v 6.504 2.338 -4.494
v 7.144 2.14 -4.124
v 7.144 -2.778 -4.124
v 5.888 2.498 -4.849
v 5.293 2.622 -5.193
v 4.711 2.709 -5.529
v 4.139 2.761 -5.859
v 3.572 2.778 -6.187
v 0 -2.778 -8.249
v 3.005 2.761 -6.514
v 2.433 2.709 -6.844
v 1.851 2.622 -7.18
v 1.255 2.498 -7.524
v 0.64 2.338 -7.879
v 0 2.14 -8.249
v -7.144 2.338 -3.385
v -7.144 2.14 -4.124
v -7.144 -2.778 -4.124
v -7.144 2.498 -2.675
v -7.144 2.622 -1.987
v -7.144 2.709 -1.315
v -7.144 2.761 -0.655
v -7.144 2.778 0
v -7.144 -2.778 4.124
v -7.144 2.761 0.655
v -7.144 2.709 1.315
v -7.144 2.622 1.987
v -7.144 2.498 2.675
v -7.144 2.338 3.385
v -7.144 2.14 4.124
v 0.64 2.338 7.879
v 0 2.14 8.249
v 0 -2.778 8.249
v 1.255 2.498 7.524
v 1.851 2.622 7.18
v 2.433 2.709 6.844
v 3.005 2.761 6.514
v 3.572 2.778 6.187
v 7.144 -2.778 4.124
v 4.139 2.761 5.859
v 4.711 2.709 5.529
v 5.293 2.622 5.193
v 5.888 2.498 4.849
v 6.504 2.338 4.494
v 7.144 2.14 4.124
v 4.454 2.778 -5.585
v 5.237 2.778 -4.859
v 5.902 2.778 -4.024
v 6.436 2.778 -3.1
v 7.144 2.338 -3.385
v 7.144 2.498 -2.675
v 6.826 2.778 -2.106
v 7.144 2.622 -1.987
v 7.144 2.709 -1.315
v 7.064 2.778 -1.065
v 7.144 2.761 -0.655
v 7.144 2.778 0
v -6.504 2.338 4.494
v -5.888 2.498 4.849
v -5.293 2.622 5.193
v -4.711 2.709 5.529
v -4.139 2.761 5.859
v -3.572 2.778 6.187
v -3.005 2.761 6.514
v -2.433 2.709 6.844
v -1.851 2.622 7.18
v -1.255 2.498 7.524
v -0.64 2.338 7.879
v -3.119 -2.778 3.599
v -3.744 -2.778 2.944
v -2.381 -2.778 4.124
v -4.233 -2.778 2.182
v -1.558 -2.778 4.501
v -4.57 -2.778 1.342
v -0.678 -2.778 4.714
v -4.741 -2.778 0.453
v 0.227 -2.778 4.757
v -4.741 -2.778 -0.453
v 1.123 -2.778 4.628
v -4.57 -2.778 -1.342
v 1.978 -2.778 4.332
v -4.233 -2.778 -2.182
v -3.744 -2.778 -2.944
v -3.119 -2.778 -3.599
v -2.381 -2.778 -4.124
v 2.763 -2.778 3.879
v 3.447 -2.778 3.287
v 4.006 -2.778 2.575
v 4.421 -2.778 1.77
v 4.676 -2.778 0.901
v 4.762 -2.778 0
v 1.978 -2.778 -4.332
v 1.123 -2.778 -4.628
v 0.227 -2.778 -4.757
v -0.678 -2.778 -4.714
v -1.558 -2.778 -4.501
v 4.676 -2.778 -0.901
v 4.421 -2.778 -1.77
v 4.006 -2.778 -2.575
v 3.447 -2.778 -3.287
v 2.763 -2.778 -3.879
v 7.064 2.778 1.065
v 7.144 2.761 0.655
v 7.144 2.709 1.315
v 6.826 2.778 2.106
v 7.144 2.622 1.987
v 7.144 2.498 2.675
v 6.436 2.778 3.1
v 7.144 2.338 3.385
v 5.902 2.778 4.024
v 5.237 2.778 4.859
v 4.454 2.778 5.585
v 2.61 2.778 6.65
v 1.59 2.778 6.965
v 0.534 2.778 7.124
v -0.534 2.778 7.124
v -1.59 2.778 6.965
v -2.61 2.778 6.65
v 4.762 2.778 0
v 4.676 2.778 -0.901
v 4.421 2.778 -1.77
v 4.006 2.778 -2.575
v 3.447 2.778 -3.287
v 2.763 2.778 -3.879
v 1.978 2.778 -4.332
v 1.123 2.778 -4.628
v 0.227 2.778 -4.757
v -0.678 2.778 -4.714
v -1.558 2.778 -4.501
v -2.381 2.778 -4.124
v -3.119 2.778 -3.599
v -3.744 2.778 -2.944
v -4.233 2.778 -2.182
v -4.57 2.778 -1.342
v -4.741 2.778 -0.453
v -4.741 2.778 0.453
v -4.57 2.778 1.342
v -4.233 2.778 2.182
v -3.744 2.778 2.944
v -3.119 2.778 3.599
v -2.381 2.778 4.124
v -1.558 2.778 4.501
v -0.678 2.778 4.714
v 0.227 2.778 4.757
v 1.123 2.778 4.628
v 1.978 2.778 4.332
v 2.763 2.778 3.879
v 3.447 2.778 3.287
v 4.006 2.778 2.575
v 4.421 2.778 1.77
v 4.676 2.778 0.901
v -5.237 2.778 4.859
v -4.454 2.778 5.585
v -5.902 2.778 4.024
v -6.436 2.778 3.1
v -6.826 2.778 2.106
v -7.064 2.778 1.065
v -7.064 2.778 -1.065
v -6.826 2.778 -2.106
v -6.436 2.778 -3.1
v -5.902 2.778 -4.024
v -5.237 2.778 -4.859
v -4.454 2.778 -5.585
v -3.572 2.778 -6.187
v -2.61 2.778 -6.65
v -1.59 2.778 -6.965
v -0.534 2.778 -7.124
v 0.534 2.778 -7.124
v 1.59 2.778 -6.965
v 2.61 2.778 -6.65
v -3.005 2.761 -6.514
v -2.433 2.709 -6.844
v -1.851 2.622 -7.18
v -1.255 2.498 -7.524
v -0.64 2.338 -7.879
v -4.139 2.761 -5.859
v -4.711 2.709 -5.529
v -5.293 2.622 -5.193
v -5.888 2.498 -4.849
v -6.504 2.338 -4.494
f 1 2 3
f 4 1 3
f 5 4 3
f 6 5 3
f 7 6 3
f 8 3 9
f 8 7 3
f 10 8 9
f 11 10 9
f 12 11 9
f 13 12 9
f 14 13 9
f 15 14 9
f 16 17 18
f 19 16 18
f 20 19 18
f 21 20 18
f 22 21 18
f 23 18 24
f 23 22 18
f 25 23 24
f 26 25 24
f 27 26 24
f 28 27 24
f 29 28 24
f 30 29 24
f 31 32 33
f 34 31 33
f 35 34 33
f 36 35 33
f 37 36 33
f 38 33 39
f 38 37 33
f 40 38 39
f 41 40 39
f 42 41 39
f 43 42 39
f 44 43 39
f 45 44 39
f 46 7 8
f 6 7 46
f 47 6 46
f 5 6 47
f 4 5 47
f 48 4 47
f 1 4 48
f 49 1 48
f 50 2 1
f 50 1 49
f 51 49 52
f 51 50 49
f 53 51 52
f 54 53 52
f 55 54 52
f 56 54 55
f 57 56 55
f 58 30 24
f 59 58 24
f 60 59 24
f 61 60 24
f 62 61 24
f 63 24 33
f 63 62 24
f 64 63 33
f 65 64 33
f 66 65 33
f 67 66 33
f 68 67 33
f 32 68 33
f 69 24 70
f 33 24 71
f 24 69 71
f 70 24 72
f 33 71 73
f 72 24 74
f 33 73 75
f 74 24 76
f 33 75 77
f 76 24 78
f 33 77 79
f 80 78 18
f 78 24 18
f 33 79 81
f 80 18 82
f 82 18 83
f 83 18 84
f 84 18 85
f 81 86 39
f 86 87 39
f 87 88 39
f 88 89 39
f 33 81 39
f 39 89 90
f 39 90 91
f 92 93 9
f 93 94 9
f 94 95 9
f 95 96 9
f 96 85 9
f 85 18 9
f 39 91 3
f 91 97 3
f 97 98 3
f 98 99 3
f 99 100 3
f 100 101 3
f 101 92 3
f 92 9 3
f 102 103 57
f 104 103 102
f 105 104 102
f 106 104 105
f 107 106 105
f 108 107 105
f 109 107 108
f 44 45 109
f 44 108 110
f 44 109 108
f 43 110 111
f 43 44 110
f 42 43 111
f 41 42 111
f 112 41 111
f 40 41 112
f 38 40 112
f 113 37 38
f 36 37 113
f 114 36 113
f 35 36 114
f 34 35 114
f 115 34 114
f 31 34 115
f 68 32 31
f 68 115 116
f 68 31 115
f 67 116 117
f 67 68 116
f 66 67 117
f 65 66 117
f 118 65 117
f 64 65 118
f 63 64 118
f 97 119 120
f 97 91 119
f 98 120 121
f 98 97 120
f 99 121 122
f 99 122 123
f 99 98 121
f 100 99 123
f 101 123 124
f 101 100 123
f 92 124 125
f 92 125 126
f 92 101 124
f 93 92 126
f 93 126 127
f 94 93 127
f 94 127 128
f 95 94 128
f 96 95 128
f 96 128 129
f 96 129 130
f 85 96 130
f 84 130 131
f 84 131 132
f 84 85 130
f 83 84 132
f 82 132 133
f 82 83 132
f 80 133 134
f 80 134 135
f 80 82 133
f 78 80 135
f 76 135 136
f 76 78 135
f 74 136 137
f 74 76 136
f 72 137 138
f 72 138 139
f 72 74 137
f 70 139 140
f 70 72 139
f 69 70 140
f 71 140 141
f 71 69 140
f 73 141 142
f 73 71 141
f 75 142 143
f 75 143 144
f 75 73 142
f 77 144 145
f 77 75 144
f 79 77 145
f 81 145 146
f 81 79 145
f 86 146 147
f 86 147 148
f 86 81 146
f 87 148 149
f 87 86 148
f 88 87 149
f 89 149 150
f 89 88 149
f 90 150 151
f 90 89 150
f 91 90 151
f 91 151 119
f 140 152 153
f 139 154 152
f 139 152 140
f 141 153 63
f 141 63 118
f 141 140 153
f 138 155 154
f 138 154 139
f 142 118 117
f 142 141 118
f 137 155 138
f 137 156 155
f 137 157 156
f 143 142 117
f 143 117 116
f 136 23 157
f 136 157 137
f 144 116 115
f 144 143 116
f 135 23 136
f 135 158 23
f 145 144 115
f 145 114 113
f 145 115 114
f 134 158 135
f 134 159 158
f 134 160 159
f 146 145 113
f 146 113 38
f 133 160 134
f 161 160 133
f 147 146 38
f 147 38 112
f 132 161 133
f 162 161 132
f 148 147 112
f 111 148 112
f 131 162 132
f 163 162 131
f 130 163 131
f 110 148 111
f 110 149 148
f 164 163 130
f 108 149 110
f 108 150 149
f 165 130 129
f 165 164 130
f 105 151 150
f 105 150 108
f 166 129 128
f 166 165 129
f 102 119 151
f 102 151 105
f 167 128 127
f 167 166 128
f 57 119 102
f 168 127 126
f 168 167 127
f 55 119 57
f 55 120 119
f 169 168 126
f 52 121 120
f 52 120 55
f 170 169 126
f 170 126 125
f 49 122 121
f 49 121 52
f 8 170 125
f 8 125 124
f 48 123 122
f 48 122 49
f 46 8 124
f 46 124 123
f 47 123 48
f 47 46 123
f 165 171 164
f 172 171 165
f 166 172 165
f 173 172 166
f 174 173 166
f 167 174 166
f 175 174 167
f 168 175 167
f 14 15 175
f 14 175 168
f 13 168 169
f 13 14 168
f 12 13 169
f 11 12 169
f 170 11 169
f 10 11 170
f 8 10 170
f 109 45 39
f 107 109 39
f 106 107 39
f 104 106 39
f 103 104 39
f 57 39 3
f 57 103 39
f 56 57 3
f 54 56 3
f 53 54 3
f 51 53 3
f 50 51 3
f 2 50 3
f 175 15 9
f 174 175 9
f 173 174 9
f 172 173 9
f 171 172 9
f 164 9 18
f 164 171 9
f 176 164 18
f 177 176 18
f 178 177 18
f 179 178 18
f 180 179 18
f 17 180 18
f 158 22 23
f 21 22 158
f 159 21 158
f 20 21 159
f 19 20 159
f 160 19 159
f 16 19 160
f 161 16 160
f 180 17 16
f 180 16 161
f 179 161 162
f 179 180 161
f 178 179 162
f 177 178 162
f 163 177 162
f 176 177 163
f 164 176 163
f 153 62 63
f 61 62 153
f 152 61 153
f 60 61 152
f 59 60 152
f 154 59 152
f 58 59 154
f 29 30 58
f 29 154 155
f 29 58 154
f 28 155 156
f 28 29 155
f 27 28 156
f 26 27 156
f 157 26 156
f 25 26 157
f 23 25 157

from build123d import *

# Parameters (mm, degrees)
SKETCH1_R           = 4.7625
BOSS_EXTRUDE1_DEPTH = 2.778125
SKETCH5_OUTSIDE_W   = 43.504
SKETCH5_OUTSIDE_H   = 45.714
SKETCH5_OUTSIDE_R   = 7.14375
CUT_EXTRUDE2_DEPTH  = 6.55625
CUT_EXTRUDE2_TAPER  = 60


with BuildPart() as part:
    # Sketch1 → Boss-Extrude1 (new body, symmetric)
    with BuildSketch(Plane(origin=(0, 0, 0), x_dir=(1, 0, 0), z_dir=(0, 1, 0))):
        Polygon((-7.14375, 4.124445986), (-7.14375, -4.124445986), (0, -8.248891971), (7.14375, -4.124445986), (7.14375, 4.124445986), (0, 8.248891971), align=None)
        Circle(SKETCH1_R, mode=Mode.SUBTRACT)
    extrude(amount=BOSS_EXTRUDE1_DEPTH, both=True)

    # Sketch5 outside → Cut-Extrude2 (cut, through all)
    with BuildSketch(Plane(origin=(0, 2.778125, 0), x_dir=(1, 0, 0), z_dir=(0, 1, 0))):
        Rectangle(SKETCH5_OUTSIDE_W, SKETCH5_OUTSIDE_H)
        Circle(SKETCH5_OUTSIDE_R, mode=Mode.SUBTRACT)
    extrude(amount=-CUT_EXTRUDE2_DEPTH, taper=CUT_EXTRUDE2_TAPER, mode=Mode.SUBTRACT)


solid = part.part
